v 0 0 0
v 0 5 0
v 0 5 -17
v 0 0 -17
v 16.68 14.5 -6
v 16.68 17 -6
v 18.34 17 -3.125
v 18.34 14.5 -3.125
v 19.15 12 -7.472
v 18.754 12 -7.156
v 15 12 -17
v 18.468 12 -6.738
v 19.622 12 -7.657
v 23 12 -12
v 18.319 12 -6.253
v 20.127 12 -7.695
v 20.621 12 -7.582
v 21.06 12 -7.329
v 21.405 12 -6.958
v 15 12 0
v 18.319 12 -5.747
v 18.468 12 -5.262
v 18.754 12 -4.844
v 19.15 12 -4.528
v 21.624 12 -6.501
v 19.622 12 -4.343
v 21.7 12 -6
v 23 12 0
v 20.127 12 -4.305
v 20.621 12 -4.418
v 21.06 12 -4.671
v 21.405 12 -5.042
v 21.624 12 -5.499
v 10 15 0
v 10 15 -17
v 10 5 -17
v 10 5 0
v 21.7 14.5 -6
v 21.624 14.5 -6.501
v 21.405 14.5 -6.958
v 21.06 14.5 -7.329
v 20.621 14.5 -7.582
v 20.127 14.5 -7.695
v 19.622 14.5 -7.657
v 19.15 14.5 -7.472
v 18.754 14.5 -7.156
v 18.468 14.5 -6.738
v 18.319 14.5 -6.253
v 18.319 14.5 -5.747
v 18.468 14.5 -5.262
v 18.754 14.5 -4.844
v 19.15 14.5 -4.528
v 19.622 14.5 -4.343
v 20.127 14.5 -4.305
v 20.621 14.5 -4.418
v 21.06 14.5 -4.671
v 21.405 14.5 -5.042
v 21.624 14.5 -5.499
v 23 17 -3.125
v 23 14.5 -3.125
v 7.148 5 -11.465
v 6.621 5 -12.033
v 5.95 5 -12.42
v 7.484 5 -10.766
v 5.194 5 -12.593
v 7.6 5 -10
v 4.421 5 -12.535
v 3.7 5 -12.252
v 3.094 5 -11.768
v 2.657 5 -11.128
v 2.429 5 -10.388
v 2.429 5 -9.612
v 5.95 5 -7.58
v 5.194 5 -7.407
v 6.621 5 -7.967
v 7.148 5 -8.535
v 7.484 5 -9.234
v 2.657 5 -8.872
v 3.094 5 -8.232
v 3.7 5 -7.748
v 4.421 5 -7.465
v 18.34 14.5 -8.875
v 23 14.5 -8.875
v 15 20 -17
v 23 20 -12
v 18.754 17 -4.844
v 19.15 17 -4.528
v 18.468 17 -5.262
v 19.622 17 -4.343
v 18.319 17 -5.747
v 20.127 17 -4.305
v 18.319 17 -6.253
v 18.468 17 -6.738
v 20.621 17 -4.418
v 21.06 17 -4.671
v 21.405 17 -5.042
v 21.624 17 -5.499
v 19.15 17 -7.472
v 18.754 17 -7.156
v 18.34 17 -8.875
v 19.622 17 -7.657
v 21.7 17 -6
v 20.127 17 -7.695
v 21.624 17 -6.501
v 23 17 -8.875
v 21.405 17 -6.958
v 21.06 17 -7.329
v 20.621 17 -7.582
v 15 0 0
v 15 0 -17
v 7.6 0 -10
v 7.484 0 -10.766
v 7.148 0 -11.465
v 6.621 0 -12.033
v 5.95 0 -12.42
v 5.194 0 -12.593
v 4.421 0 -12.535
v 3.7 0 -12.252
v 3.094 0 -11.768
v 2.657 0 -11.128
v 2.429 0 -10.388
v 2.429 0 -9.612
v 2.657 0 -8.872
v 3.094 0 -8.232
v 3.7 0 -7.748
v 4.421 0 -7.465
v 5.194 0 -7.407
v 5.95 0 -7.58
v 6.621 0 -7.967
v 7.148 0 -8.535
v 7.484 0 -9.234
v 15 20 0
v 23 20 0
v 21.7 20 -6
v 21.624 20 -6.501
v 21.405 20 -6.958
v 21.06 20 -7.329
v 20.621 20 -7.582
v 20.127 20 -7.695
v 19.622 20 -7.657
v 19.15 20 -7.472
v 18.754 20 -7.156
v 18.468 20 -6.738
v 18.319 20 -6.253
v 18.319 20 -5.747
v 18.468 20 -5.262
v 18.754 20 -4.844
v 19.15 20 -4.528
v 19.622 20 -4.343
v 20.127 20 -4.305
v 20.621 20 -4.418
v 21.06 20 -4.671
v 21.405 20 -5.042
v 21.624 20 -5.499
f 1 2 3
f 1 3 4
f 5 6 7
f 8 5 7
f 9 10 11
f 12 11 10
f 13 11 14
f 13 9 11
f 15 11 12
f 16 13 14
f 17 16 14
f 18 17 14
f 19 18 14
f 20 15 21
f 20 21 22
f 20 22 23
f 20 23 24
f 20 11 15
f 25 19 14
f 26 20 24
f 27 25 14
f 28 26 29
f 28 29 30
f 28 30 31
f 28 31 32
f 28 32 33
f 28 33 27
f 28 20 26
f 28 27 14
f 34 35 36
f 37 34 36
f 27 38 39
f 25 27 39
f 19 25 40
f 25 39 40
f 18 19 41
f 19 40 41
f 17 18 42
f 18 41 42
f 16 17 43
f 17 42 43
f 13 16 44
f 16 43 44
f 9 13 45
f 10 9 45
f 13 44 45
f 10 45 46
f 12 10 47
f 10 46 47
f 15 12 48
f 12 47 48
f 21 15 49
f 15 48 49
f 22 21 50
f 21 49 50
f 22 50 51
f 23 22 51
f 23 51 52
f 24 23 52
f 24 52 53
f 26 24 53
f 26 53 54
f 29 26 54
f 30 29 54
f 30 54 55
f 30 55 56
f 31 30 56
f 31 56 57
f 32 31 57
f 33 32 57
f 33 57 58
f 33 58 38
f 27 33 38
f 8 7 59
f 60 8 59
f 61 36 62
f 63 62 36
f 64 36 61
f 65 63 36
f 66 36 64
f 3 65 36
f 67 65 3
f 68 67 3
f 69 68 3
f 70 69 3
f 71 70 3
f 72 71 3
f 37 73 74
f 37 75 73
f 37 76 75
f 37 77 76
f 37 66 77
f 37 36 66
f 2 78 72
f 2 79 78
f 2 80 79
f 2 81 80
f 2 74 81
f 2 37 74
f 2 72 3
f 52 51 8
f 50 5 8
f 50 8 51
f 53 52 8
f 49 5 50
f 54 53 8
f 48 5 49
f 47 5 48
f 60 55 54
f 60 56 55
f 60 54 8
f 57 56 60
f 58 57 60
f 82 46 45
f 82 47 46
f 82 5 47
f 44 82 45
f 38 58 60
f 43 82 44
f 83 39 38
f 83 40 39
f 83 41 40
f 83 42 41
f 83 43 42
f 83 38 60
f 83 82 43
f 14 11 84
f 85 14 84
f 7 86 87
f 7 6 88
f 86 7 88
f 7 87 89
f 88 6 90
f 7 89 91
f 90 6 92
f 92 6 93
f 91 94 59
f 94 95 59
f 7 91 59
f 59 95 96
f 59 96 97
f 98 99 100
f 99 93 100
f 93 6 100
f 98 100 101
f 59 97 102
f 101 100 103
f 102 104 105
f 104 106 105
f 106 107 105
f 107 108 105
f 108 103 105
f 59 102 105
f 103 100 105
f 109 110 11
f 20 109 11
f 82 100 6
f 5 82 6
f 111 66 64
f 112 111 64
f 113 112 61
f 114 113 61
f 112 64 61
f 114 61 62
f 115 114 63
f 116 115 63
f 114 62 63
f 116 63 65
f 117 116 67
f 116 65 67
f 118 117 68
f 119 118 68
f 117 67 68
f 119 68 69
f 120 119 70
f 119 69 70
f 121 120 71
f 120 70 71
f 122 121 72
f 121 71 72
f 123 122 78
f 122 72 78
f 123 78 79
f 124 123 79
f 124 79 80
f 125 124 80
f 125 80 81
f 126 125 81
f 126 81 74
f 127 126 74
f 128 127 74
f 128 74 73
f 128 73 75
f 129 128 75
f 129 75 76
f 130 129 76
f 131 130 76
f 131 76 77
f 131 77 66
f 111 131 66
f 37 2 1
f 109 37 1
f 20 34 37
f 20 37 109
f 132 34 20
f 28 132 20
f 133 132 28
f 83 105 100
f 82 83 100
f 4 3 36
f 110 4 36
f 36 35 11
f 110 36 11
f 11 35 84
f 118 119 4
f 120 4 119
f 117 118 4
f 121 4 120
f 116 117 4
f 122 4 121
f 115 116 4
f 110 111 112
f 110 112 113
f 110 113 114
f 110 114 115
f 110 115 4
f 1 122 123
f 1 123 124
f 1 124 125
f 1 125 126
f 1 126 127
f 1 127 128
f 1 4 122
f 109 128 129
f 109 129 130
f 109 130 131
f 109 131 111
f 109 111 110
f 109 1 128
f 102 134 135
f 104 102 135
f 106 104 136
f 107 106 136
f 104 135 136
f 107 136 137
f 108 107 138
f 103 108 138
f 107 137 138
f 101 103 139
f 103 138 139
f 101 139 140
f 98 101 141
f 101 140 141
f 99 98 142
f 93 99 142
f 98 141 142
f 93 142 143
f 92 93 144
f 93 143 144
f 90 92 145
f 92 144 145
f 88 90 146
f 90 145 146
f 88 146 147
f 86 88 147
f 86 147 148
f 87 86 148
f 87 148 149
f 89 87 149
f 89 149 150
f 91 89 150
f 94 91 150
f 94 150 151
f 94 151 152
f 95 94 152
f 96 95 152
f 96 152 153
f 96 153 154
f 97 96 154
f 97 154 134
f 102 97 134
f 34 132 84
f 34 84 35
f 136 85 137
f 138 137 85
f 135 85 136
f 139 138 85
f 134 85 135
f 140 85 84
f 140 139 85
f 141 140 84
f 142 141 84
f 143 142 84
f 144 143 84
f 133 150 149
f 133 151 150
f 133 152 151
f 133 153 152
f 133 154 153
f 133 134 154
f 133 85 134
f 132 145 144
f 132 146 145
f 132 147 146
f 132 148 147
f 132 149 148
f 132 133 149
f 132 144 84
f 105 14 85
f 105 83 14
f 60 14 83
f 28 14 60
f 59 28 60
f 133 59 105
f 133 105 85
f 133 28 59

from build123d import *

# Parameters (mm, degrees)
RESSALTO_EXTRUS_O1_DEPTH = 17
ESBO_O2_R                = 2.6
CORTE_EXTRUS_O1_DEPTH    = 20
CHANFRO1_SIZE            = 8
CHANFRO1_SIZE2           = 5
ESBO_O3_R                = 1.7
CORTE_EXTRUS_O2_DEPTH    = 21
CORTE_EXTRUS_O3_START    = -3
CORTE_EXTRUS_O3_DEPTH    = 2.5


with BuildPart() as part:
    # Esboço1 → Ressalto-extrusão1 (new body)
    with BuildSketch(Plane.XY):
        Polygon((0, 0), (15, 0), (15, 12), (23, 12), (23, 20), (15, 20), (10, 15), (10, 5), (0, 5), align=None)
    extrude(amount=-RESSALTO_EXTRUS_O1_DEPTH)

    # Esboço2 → Corte-extrusão1 (cut)
    with BuildSketch(Plane(origin=(0, 5, 0), x_dir=(1, 0, 0), z_dir=(0, 1, 0))):
        with Locations((5, 10)):
            Circle(ESBO_O2_R)
    extrude(amount=-CORTE_EXTRUS_O1_DEPTH, mode=Mode.SUBTRACT)

    # Chanfro1
    chanfro1_edges = [part.edges().sort_by_distance(p)[0] for p in [
        (23, 16, -17),
    ]]
    chanfro1_side = [part.faces().sort_by_distance(p)[0] for p in [
        (12.755169562, 9.52770885, -17),
    ]]
    chamfer(chanfro1_edges, length=CHANFRO1_SIZE, length2=CHANFRO1_SIZE2, reference=chanfro1_side[0])

    # Esboço3 → Corte-extrusão2 (cut, through all)
    with BuildSketch(Plane(origin=(0, 20, 0), x_dir=(1, 0, 0), z_dir=(0, 1, 0))):
        with Locations((20, 6)):
            Circle(ESBO_O3_R)
    extrude(amount=-CORTE_EXTRUS_O2_DEPTH, mode=Mode.SUBTRACT)

    # Esboço4 → Corte-extrusão3 (cut)
    with BuildSketch(Plane(origin=(0, 20, 0), x_dir=(1, 0, 0), z_dir=(0, 1, 0)).offset(CORTE_EXTRUS_O3_START)):
        Polygon((23, 8.875), (18.340117976, 8.875), (16.680235952, 6), (18.340117976, 3.125), (23, 3.125), align=None)
    extrude(amount=-CORTE_EXTRUS_O3_DEPTH, mode=Mode.SUBTRACT)


solid = part.part
